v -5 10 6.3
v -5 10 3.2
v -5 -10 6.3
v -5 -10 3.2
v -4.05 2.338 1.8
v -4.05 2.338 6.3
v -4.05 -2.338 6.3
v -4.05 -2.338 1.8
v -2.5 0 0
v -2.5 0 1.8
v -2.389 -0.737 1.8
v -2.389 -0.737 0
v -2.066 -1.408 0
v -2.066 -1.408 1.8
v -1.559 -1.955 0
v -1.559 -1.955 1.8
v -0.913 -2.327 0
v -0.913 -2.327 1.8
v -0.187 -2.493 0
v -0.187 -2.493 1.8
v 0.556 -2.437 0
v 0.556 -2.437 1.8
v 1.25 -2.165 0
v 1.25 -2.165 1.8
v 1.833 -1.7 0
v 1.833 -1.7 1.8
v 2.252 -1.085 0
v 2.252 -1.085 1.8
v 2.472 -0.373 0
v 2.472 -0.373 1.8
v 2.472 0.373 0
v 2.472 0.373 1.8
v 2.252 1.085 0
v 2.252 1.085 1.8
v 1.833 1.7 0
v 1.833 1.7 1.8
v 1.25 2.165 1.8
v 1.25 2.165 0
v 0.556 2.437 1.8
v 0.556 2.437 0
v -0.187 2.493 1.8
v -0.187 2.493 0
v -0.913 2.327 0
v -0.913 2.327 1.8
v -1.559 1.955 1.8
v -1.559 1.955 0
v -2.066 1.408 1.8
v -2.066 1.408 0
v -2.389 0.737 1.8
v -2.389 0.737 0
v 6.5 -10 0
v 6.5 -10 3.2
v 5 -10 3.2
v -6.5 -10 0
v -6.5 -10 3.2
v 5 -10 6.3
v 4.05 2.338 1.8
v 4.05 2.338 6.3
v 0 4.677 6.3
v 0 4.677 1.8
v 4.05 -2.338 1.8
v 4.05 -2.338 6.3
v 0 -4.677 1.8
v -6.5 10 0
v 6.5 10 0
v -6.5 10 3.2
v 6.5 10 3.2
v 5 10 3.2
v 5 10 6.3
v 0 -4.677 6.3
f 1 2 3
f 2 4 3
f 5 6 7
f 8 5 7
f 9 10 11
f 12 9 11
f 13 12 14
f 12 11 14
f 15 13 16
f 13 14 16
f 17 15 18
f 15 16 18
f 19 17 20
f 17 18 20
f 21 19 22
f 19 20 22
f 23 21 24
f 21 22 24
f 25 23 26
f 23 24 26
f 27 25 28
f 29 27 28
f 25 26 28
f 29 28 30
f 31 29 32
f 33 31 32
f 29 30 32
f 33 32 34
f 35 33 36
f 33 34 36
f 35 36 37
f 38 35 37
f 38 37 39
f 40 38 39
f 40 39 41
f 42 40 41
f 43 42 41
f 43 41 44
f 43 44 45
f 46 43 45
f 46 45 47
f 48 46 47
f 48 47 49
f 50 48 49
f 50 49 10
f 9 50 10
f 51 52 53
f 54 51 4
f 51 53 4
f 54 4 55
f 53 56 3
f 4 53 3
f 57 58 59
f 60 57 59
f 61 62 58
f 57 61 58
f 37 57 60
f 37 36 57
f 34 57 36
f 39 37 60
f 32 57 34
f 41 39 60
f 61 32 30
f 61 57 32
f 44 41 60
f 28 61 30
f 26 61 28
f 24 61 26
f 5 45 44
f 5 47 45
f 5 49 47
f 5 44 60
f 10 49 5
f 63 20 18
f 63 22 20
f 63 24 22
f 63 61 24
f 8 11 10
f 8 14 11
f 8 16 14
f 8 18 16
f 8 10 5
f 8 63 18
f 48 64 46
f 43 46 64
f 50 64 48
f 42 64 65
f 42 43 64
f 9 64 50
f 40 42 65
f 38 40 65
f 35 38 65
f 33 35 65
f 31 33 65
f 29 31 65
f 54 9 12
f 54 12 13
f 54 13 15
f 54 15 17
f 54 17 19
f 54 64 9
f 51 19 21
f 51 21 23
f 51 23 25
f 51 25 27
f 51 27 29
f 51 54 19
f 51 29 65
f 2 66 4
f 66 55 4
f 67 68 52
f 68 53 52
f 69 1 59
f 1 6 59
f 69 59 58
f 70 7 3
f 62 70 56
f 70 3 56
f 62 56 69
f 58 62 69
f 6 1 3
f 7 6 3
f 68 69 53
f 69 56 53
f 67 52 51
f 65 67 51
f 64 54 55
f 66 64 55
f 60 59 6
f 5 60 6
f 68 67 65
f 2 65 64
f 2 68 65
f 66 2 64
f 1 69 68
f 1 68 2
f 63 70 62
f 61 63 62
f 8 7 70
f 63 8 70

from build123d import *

# Parameters (mm, degrees)
PAD_DEPTH       = 10
SKETCH001_R     = 2.5
POCKET_DEPTH    = 6.301
POCKET001_DEPTH = 4.5


with BuildPart() as part:
    # Sketch → Pad (new body, symmetric)
    with BuildSketch(Plane.XZ):
        Polygon((-6.5, 0), (-6.5, 3.2), (-5, 3.2), (-5, 6.3), (5, 6.3), (5, 3.2), (6.5, 3.2), (6.5, 0), (0, 0), align=None)
    extrude(amount=PAD_DEPTH, both=True)

    # Sketch001 (on Face4 of Pad) → Pocket (cut, through all)
    with BuildSketch(Plane(origin=(0, 0, 6.3), x_dir=(-1, 0, 0), z_dir=(0, 0, 1))):
        Circle(SKETCH001_R)
    extrude(amount=-POCKET_DEPTH, mode=Mode.SUBTRACT)

    # Sketch002 (on Face9 of Pocket) → Pocket001 (cut)
    with BuildSketch(Plane(origin=(0, 0, 6.3), x_dir=(-1, 0, 0), z_dir=(0, 0, 1))):
        Polygon((-4.05, 2.338269), (-4.05, -2.338269), (0, -4.676537), (4.05, -2.338269), (4.05, 2.338269), (0, 4.676537), align=None)
    extrude(amount=-POCKET001_DEPTH, mode=Mode.SUBTRACT)


solid = part.part
